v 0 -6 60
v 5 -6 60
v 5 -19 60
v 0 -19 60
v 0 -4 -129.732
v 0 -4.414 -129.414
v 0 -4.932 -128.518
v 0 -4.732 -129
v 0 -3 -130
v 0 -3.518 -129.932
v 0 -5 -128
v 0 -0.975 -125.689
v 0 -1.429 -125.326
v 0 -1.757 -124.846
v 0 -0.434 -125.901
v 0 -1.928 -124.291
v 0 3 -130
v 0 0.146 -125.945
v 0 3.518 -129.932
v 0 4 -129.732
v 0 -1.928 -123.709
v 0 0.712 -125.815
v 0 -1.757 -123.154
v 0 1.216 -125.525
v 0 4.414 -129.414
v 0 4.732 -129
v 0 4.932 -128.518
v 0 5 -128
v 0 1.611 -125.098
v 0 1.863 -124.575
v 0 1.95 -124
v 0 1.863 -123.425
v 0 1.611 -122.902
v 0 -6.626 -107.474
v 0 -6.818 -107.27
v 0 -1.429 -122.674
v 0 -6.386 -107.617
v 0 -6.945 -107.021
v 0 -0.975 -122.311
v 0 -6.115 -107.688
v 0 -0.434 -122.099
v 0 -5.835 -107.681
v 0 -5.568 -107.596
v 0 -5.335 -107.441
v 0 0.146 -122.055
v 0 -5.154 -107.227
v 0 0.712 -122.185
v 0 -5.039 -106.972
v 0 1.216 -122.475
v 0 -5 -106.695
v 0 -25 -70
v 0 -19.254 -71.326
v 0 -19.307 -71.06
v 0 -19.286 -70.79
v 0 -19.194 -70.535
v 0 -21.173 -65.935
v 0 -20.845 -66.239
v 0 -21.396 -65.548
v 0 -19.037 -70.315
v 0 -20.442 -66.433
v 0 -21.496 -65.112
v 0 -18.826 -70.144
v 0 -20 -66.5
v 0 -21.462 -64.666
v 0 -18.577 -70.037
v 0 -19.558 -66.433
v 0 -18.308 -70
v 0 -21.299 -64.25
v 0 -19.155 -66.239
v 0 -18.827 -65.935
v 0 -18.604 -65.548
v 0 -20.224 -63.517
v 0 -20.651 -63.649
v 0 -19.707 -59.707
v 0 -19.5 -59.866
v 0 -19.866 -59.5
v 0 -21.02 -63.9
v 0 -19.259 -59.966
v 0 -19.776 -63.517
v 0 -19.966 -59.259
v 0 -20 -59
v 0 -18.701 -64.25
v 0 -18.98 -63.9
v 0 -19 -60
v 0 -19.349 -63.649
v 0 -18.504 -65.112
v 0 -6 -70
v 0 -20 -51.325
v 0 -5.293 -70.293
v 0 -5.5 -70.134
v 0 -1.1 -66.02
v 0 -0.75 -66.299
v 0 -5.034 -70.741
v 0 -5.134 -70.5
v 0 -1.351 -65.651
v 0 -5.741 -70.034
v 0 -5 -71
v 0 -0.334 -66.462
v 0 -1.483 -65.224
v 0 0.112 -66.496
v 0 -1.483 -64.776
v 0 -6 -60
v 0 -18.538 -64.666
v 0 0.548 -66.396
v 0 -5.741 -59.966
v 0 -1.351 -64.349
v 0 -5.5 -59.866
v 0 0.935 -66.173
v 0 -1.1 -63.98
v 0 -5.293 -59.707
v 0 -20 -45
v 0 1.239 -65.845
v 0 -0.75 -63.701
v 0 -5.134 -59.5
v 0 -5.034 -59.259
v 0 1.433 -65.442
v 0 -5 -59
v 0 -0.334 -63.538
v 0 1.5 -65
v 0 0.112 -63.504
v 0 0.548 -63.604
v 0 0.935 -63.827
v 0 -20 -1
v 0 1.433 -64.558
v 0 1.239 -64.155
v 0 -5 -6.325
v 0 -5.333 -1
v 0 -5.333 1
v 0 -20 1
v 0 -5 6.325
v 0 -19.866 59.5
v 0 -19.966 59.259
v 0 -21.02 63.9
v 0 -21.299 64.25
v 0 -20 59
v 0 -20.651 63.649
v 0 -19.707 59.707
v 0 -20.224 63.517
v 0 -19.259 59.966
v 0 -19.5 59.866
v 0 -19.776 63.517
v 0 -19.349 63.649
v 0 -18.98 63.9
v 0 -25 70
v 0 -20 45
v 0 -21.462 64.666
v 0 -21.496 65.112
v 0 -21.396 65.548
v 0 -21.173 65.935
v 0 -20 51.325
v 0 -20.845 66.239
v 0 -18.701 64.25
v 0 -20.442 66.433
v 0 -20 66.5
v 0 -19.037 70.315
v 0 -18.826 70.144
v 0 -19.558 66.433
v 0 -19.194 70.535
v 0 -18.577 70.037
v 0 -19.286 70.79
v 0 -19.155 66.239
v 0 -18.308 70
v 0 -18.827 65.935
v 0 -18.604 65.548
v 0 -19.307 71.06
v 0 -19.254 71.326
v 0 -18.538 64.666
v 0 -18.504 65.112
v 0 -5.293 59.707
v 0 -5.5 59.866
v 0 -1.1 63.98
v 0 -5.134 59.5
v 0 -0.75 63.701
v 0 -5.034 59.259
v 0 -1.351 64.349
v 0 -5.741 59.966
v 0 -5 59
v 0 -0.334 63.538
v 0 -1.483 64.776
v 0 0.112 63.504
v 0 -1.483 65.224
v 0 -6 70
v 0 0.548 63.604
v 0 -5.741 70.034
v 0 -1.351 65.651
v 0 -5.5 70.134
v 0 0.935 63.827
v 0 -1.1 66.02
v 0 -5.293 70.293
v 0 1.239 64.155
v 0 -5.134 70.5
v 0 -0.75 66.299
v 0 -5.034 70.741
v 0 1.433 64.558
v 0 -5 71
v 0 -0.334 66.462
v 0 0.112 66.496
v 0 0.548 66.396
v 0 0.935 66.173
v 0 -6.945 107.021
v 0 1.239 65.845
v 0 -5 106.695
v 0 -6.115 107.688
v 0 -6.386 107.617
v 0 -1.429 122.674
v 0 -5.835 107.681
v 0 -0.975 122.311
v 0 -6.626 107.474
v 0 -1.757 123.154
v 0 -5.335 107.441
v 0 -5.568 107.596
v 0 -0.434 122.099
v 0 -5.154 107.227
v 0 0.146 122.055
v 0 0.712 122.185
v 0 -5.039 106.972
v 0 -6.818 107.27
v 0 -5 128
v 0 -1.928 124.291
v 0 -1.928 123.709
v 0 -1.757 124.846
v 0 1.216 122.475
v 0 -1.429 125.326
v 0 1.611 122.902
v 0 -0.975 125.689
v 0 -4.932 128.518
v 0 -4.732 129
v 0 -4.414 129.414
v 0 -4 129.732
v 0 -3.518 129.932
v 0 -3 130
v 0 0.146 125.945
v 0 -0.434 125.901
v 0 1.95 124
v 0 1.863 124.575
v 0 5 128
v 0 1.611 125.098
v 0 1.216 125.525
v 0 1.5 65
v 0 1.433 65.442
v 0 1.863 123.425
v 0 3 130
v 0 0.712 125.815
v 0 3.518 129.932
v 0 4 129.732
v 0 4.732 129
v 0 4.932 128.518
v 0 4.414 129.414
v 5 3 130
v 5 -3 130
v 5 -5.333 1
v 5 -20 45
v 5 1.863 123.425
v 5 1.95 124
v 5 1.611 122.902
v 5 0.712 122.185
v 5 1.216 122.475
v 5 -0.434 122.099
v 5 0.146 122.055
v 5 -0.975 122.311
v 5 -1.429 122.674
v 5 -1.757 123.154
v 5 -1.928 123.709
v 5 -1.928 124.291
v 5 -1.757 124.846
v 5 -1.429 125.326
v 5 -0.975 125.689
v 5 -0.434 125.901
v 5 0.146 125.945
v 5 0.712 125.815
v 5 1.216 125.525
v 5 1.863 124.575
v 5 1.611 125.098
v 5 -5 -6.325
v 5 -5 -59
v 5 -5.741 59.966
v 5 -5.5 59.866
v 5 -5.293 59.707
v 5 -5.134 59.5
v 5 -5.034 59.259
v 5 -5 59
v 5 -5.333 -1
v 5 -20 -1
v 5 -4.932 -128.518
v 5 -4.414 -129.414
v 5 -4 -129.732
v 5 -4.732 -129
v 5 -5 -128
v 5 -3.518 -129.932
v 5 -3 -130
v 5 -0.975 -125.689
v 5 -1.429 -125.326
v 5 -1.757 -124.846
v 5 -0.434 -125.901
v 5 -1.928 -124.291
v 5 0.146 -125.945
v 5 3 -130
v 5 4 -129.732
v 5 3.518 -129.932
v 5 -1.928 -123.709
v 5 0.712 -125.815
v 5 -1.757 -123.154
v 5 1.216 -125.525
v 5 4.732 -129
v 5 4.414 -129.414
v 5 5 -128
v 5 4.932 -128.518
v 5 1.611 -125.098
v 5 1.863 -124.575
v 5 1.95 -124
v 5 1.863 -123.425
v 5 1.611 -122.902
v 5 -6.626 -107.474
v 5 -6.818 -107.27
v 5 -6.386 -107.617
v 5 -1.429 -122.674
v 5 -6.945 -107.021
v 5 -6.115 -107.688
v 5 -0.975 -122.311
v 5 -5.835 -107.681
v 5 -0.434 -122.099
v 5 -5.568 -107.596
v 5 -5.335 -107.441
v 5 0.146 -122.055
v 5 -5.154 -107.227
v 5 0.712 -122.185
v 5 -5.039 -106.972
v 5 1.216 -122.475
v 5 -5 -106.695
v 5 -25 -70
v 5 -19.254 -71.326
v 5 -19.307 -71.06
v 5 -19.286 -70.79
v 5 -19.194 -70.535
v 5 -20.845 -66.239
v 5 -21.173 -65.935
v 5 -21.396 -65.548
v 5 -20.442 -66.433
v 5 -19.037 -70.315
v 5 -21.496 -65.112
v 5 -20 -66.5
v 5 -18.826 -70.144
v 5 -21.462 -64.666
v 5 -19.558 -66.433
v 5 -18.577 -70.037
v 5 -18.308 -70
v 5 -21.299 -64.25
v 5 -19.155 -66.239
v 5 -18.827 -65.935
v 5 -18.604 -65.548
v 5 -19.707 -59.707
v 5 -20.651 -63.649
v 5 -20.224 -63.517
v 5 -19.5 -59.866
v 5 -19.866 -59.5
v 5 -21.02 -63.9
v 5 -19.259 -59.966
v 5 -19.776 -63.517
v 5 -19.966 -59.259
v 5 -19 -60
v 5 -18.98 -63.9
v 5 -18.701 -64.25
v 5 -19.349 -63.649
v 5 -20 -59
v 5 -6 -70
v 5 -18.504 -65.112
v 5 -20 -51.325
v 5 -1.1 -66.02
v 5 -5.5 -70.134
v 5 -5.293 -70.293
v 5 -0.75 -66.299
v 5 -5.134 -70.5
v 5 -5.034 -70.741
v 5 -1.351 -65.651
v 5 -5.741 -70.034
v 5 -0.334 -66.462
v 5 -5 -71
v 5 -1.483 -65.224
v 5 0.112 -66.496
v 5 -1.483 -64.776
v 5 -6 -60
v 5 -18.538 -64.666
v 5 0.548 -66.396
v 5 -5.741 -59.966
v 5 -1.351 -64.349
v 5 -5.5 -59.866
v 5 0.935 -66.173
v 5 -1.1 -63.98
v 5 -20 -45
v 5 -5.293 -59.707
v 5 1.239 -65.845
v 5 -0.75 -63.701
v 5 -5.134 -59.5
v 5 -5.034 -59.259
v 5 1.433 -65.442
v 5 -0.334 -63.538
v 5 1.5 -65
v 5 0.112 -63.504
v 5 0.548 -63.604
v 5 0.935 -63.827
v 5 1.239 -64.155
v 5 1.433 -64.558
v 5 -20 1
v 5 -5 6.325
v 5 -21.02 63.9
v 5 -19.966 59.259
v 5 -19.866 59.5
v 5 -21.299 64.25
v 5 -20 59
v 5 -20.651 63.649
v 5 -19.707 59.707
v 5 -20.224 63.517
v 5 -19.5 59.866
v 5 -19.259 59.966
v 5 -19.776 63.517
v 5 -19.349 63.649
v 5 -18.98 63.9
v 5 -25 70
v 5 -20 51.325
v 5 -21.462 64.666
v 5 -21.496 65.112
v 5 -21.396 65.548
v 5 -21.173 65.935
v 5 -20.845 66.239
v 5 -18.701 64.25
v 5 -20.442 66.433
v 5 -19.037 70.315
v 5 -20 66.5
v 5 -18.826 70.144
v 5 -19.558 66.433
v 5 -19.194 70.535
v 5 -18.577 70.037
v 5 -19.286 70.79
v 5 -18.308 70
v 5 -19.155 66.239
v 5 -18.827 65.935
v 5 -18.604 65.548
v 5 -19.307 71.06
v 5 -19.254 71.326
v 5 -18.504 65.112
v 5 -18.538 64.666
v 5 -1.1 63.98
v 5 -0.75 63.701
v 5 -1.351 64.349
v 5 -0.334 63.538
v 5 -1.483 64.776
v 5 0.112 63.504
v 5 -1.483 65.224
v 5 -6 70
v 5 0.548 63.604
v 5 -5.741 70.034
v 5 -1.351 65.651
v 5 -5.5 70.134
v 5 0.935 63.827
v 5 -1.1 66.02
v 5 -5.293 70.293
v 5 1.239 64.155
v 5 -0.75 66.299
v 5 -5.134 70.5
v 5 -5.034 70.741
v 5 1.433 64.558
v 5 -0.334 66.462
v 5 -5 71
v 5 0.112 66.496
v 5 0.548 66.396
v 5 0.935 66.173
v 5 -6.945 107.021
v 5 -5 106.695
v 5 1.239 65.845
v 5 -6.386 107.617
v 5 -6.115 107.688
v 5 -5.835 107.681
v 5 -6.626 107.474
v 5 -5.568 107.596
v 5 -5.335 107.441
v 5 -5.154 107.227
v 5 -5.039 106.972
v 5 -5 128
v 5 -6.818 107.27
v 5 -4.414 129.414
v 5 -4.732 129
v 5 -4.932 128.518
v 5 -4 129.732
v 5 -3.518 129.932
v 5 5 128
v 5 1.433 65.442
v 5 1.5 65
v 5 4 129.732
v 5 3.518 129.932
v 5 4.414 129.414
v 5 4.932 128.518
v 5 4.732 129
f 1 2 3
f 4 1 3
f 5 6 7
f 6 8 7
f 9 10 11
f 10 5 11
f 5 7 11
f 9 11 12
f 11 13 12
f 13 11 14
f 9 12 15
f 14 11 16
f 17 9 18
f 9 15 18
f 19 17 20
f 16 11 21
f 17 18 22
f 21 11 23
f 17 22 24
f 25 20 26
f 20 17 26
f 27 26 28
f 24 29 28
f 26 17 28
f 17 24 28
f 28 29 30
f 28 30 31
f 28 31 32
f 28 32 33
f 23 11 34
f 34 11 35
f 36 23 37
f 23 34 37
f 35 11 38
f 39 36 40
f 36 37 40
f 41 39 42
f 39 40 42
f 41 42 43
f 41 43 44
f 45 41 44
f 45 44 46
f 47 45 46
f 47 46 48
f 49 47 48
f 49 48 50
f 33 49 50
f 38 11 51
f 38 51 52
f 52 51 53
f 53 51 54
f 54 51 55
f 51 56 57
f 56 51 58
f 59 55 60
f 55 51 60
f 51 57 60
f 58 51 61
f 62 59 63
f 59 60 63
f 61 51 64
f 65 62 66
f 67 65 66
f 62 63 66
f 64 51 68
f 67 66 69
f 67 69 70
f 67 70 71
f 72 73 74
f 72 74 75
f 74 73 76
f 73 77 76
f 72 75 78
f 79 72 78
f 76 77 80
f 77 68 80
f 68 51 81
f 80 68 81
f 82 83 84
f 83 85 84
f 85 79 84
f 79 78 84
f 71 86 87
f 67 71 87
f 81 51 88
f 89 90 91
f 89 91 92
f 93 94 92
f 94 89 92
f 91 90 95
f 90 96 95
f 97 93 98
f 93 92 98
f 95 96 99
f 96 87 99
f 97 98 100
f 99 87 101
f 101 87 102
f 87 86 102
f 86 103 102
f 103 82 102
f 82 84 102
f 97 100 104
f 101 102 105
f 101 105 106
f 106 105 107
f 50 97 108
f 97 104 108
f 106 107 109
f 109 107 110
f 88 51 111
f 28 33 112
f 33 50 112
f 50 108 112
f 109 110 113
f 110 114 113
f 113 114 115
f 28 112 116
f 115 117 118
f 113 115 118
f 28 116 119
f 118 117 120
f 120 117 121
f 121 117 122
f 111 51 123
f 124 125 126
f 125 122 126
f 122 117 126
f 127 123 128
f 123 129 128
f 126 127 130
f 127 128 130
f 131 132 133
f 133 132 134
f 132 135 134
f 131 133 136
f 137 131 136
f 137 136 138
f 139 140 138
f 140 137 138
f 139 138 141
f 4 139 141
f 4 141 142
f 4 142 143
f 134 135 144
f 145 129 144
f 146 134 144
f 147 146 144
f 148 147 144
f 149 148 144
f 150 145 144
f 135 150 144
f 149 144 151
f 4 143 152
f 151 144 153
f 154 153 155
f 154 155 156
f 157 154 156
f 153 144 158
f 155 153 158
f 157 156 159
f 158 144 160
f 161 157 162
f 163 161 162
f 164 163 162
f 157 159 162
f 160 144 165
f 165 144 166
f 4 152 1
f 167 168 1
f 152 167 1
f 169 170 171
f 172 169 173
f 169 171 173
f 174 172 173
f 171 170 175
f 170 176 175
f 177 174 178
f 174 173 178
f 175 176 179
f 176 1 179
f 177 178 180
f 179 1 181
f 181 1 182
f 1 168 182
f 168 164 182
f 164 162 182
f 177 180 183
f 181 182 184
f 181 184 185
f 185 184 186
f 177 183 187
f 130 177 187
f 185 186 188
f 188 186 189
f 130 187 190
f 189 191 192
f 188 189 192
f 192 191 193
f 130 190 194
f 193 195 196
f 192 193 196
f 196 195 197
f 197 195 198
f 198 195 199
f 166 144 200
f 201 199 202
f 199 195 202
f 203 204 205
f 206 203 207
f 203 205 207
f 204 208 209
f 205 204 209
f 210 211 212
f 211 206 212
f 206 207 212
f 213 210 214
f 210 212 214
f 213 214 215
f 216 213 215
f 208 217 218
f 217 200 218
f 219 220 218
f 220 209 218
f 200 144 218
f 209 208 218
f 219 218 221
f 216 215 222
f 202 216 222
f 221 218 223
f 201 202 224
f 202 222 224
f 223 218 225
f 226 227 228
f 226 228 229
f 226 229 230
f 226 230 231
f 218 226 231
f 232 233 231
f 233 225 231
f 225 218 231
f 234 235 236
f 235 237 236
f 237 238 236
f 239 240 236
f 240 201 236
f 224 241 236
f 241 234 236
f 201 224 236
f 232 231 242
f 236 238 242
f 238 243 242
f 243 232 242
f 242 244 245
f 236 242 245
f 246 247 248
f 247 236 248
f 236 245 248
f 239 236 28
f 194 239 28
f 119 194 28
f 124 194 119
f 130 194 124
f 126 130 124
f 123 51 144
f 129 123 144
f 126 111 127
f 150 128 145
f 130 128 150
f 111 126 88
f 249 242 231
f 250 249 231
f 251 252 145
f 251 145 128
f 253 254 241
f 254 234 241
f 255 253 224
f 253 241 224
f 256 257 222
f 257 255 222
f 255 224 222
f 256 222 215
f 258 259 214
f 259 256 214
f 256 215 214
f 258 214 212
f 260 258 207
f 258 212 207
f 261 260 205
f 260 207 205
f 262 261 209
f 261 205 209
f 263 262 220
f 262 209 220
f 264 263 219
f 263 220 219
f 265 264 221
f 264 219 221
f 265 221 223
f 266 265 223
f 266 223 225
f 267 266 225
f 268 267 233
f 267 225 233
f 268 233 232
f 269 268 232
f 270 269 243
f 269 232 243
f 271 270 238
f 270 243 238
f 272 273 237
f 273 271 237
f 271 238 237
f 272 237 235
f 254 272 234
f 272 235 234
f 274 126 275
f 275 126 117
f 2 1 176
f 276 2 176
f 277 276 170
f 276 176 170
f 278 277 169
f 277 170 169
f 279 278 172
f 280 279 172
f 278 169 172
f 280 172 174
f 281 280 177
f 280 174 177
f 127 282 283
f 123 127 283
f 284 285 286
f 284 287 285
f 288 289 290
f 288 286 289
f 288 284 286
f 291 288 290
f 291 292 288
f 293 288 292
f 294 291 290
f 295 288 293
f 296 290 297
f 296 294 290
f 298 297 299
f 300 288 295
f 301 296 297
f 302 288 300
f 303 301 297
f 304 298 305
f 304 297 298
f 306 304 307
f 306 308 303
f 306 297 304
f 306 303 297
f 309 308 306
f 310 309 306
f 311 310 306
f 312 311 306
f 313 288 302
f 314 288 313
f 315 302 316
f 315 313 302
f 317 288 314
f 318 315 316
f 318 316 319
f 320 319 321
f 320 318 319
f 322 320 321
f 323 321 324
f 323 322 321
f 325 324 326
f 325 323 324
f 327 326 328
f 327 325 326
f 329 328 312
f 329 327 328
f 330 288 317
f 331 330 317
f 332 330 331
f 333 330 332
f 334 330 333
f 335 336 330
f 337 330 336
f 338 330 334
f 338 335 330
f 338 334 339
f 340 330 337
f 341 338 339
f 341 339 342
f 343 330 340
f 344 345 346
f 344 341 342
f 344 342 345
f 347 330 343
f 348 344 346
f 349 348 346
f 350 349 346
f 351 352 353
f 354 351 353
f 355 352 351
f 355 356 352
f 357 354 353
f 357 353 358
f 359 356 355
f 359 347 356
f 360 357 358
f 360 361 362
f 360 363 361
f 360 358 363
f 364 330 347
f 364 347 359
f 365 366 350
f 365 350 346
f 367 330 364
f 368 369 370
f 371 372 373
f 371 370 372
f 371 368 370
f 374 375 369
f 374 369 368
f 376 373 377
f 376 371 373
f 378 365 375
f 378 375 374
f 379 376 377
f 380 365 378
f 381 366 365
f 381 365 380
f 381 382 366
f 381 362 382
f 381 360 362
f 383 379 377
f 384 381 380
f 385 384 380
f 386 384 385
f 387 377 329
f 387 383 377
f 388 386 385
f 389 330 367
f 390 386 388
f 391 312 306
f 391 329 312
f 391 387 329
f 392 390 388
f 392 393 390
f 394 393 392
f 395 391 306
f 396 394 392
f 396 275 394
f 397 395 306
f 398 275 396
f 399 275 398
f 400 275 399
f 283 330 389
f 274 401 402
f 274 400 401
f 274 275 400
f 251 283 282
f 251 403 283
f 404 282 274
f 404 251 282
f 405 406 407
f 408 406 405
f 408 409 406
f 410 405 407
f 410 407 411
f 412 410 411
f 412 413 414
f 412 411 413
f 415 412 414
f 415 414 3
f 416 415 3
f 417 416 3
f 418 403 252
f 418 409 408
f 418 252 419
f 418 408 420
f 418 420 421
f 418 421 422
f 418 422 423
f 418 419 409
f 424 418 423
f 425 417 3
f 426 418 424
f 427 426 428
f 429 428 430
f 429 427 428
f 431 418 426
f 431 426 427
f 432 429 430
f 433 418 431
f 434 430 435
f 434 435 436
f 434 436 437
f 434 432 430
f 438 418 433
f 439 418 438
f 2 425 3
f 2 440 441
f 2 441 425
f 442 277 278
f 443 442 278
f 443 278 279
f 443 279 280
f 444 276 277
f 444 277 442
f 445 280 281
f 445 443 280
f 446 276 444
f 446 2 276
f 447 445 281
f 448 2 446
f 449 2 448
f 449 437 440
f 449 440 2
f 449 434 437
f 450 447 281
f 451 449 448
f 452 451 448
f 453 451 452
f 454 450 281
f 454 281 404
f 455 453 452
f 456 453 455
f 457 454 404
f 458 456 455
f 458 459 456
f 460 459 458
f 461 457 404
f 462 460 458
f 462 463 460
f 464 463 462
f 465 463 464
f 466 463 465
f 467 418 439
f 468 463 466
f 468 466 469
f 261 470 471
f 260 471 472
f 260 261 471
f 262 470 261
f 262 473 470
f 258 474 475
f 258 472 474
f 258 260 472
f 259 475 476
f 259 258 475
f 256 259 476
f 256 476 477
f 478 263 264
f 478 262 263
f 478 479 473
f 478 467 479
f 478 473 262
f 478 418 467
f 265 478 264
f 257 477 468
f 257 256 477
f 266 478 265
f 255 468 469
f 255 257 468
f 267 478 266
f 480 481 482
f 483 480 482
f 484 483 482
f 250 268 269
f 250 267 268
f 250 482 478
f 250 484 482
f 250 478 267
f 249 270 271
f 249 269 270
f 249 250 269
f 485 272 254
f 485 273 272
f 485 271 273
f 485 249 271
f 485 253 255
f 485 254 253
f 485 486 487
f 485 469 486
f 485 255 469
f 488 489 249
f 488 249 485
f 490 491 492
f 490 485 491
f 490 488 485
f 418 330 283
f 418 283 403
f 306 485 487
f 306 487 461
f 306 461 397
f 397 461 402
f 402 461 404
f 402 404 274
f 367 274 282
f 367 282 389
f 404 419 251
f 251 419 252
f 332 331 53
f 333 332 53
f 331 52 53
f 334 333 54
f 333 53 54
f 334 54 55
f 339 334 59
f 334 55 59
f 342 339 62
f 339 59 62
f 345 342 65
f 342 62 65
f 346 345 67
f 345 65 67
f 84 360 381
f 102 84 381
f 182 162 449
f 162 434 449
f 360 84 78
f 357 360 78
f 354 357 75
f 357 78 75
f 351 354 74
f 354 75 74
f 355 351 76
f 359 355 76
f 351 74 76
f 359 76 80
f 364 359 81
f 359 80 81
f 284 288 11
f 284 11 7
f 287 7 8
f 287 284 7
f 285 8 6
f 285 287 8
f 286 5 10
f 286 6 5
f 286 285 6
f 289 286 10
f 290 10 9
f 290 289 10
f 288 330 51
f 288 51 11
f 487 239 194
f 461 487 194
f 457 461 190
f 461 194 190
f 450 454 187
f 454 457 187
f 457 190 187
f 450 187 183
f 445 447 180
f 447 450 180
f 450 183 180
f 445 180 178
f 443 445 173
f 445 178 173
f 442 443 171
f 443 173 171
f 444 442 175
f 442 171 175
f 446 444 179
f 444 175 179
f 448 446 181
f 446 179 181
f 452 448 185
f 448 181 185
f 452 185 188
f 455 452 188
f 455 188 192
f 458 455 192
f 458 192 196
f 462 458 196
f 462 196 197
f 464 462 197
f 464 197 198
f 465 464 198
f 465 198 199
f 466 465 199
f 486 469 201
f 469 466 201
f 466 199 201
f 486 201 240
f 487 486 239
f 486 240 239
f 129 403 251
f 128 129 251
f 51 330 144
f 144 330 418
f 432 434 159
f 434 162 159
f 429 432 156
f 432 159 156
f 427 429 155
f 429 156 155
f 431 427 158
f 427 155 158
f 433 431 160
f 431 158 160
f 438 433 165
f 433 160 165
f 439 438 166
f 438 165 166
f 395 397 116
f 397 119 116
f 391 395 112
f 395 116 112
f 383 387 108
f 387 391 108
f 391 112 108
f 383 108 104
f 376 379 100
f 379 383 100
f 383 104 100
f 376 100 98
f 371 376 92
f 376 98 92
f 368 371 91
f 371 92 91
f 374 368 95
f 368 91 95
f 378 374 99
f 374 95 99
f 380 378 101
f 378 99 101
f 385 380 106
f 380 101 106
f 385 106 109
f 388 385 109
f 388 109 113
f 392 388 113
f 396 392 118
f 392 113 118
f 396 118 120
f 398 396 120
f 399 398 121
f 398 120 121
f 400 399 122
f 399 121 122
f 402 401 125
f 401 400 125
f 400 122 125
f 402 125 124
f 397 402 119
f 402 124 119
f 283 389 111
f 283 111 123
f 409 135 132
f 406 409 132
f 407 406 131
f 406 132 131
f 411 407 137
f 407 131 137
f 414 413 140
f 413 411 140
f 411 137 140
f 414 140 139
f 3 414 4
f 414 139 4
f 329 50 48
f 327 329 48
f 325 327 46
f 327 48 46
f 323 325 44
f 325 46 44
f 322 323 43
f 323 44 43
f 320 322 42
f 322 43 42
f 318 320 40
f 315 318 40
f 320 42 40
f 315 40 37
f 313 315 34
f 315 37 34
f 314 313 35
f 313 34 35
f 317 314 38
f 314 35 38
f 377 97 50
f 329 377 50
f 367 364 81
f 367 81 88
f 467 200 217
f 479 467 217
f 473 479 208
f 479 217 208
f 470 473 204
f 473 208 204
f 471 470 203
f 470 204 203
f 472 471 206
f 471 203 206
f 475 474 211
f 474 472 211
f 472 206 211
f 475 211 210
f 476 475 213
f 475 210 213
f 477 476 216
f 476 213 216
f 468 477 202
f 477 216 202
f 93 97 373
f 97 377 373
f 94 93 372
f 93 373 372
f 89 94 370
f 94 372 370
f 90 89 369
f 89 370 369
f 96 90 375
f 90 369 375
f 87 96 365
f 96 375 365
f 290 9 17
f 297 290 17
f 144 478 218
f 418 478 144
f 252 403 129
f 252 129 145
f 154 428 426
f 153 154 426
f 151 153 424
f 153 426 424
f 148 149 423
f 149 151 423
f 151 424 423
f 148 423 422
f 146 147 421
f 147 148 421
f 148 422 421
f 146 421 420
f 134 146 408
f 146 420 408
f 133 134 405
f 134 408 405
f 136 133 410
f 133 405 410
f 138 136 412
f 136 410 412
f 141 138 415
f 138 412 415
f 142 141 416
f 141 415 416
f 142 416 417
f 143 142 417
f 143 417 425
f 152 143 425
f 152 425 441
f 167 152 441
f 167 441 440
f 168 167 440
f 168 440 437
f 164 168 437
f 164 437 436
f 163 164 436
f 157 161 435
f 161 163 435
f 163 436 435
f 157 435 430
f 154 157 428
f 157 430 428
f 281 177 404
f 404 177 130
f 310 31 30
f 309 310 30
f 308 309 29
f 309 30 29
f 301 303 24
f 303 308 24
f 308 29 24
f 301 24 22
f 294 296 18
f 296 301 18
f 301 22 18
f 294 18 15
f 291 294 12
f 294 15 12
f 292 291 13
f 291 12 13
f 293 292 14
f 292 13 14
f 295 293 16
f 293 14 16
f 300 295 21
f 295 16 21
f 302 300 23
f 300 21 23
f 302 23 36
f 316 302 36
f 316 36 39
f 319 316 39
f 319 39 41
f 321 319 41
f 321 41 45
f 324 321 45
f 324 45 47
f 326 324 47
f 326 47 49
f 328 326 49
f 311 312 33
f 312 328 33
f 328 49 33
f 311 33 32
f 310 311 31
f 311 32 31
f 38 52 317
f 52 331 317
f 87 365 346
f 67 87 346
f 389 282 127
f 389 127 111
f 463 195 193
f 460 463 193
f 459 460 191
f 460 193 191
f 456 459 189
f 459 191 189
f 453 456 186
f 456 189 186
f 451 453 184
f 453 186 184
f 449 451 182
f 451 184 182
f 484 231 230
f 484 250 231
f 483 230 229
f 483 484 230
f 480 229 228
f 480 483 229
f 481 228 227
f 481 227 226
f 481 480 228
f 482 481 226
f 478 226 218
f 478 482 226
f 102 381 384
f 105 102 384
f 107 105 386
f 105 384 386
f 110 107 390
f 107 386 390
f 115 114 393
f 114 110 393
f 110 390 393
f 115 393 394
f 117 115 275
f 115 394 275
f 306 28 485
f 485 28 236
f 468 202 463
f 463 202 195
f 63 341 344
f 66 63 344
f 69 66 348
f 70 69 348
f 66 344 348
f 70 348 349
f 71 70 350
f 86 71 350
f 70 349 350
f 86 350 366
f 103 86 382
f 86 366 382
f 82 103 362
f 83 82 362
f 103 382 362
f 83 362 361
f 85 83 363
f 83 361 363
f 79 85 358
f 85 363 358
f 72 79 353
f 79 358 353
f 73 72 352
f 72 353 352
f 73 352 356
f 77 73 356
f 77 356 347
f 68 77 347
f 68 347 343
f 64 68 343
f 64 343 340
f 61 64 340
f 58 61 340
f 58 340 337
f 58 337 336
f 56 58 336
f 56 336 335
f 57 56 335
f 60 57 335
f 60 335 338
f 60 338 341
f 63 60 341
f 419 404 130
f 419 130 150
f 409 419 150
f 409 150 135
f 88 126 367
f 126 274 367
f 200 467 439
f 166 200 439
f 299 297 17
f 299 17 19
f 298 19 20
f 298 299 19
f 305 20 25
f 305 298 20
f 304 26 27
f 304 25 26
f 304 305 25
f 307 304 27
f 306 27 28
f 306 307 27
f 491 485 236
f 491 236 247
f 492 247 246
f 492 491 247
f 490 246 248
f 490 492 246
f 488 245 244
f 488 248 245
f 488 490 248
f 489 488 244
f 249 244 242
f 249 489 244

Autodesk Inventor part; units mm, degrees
ref_plane "YZ Plane" through (0, 0, 0) normal (1, 0, 0) x (0, 1, 0)
ref_plane "XZ Plane" through (0, 0, 0) normal (0, 1, 0) x (-1, 0, 0)
sketch "Sketch1" plane through (0, 0, 0) normal (1, 0, 0) x (0, 1, 0)
  line L0 (-5, 130) -> (-5, -130)
  line L1 (-5, -130) -> (5, -130)
  line L2 (5, -130) -> (5, 130)
  line L3 (5, 130) -> (-5, 130)
  line L4 (-5, 130) -> (5, -130) construction
  line L5 (-5, -130) -> (5, 130) construction
  circle A0 centre (0, -124) radius 1.95
  circle A1 centre (0, 124) radius 1.95
  line L6 (-5, -70) -> (-5, -60)
  circle A2 centre (0, -65) radius 1.5
  circle A3 centre (0, 65) radius 1.5
  point P0 (0, 0)
  point P1 (0, 0)
  dimension "d0" = 260
  dimension "d1" = 10
  dimension "d2" = 3.9
  dimension "d3" = 6
  dimension "d4" = 3.9
  dimension "d5" = 6
  dimension "d25" = 3
  dimension "d27" = 59
  dimension "d28" = 3
  dimension "d29" = 59
extrude "Extrusion1" add sketch "Sketch1" along normal blind 5
fillet "Fillet1" radius 2 4 edges at (2.5, 5, 130) (2.5, -5, 130) (2.5, 5, -130) (2.5, -5, -130)
sketch "Sketch2" plane through (5, 0, 0) normal (1, 0, 0) x (0, 0, -1)
  line L0 (-128, -5) -> (128, -5) projected
  line L1 (60, -5) -> (70, -5)
  line L2 (70, -5) -> (70, -25)
  line L3 (70, -25) -> (60, -25)
  line L4 (60, -25) -> (60, -5)
  circle A0 centre (65, -20) radius 1.5
  circle A1 centre (124, 0) radius 1.95 projected
  line L5 (70, -25) -> (128, -5)
  line L6 (70, -19.7111) -> (112.6621, -5)
  point P0 (0, 0)
  dimension "d15" = 3
  dimension "d16" = 20
  dimension "d17" = 5
  dimension "d18" = 10
  dimension "d20" = 59
  dimension "d23" = 5
  dimension "d32" = 5
extrude "Extrusion2" add sketch "Sketch2" against normal blind 5 contours L0 L2 L3 L4 | L0 L5 L2 L6
mirror "Mirror1" about plane through (0, 0, 0) normal (0, 0, 1) of "Extrusion2"
sketch "Sketch4" plane through (5, 0, 0) normal (1, 0, 0) x (0, 0, -1)
  line L0 (-60, -25) -> (-60, -5) projected
  line L1 (60, -25) -> (60, -5) projected
  line L2 (-60, -25) -> (60, -25)
  line L3 (60, -25) -> (60, -20)
  line L4 (60, -20) -> (-60, -20)
  line L5 (-60, -20) -> (-60, -25)
  line L6 (-60, -25) -> (0, -5)
  line L7 (-60, -5) -> (60, -5) projected
  line L8 (70, -25) -> (60, -25) projected
  line L9 (0, -5) -> (60, -25)
  line L10 (60, -25) -> (60, -22.5)
  line L11 (6.3246, -5) -> (60, -22.8918)
  line L12 (-6.3246, -5) -> (-60, -22.8918)
  line L13 (-60, -5) -> (60, -5) projected
  line L14 (-1, -5) -> (1, -5)
  line L15 (1, -5) -> (1, -20)
  line L16 (1, -20) -> (-1, -20)
  line L17 (-1, -20) -> (-1, -5)
  point P0 (0, 0)
  point P1 (-60, -20)
  point P2 (-51.3246, -20)
  point P3 (-45, -20)
  point P4 (51.3246, -20)
  point P5 (45, -20)
  point P6 (-1, -5.3333)
  point P7 (-1, -20)
  point P8 (1, -5.3333)
  dimension "d33" = 5
  dimension "d37" = 2
  dimension "d38" = 2
  dimension "d39" = 1
  dimension "d40" = 1
extrude "Extrusion3" add sketch "Sketch4" against normal blind 5 contours L6 L4 L9 L2 | L0 L12 L4 L6 | L0 L4 L12 | L9 L4 L11 L1 | L4 L12 L7 L17 L6 | L11 L4 L1 | L9 L15 L7 L11 L4 | L17 L6 L9 L15 L4 | L17 L7 L6 | L9 L7 L15
fillet "Fillet3" radius 1 10 edges at (2.5, -19.7111, -70) (2.5, -5, -112.6621) (2.5, -5, -70) (2.5, -20, -60) (2.5, -5, -60) (2.5, -20, 60) (2.5, -5, 60) (2.5, -5, 112.6621) (2.5, -5, 70) (2.5, -19.7111, 70)
properties part number "Horizontal_bar"
